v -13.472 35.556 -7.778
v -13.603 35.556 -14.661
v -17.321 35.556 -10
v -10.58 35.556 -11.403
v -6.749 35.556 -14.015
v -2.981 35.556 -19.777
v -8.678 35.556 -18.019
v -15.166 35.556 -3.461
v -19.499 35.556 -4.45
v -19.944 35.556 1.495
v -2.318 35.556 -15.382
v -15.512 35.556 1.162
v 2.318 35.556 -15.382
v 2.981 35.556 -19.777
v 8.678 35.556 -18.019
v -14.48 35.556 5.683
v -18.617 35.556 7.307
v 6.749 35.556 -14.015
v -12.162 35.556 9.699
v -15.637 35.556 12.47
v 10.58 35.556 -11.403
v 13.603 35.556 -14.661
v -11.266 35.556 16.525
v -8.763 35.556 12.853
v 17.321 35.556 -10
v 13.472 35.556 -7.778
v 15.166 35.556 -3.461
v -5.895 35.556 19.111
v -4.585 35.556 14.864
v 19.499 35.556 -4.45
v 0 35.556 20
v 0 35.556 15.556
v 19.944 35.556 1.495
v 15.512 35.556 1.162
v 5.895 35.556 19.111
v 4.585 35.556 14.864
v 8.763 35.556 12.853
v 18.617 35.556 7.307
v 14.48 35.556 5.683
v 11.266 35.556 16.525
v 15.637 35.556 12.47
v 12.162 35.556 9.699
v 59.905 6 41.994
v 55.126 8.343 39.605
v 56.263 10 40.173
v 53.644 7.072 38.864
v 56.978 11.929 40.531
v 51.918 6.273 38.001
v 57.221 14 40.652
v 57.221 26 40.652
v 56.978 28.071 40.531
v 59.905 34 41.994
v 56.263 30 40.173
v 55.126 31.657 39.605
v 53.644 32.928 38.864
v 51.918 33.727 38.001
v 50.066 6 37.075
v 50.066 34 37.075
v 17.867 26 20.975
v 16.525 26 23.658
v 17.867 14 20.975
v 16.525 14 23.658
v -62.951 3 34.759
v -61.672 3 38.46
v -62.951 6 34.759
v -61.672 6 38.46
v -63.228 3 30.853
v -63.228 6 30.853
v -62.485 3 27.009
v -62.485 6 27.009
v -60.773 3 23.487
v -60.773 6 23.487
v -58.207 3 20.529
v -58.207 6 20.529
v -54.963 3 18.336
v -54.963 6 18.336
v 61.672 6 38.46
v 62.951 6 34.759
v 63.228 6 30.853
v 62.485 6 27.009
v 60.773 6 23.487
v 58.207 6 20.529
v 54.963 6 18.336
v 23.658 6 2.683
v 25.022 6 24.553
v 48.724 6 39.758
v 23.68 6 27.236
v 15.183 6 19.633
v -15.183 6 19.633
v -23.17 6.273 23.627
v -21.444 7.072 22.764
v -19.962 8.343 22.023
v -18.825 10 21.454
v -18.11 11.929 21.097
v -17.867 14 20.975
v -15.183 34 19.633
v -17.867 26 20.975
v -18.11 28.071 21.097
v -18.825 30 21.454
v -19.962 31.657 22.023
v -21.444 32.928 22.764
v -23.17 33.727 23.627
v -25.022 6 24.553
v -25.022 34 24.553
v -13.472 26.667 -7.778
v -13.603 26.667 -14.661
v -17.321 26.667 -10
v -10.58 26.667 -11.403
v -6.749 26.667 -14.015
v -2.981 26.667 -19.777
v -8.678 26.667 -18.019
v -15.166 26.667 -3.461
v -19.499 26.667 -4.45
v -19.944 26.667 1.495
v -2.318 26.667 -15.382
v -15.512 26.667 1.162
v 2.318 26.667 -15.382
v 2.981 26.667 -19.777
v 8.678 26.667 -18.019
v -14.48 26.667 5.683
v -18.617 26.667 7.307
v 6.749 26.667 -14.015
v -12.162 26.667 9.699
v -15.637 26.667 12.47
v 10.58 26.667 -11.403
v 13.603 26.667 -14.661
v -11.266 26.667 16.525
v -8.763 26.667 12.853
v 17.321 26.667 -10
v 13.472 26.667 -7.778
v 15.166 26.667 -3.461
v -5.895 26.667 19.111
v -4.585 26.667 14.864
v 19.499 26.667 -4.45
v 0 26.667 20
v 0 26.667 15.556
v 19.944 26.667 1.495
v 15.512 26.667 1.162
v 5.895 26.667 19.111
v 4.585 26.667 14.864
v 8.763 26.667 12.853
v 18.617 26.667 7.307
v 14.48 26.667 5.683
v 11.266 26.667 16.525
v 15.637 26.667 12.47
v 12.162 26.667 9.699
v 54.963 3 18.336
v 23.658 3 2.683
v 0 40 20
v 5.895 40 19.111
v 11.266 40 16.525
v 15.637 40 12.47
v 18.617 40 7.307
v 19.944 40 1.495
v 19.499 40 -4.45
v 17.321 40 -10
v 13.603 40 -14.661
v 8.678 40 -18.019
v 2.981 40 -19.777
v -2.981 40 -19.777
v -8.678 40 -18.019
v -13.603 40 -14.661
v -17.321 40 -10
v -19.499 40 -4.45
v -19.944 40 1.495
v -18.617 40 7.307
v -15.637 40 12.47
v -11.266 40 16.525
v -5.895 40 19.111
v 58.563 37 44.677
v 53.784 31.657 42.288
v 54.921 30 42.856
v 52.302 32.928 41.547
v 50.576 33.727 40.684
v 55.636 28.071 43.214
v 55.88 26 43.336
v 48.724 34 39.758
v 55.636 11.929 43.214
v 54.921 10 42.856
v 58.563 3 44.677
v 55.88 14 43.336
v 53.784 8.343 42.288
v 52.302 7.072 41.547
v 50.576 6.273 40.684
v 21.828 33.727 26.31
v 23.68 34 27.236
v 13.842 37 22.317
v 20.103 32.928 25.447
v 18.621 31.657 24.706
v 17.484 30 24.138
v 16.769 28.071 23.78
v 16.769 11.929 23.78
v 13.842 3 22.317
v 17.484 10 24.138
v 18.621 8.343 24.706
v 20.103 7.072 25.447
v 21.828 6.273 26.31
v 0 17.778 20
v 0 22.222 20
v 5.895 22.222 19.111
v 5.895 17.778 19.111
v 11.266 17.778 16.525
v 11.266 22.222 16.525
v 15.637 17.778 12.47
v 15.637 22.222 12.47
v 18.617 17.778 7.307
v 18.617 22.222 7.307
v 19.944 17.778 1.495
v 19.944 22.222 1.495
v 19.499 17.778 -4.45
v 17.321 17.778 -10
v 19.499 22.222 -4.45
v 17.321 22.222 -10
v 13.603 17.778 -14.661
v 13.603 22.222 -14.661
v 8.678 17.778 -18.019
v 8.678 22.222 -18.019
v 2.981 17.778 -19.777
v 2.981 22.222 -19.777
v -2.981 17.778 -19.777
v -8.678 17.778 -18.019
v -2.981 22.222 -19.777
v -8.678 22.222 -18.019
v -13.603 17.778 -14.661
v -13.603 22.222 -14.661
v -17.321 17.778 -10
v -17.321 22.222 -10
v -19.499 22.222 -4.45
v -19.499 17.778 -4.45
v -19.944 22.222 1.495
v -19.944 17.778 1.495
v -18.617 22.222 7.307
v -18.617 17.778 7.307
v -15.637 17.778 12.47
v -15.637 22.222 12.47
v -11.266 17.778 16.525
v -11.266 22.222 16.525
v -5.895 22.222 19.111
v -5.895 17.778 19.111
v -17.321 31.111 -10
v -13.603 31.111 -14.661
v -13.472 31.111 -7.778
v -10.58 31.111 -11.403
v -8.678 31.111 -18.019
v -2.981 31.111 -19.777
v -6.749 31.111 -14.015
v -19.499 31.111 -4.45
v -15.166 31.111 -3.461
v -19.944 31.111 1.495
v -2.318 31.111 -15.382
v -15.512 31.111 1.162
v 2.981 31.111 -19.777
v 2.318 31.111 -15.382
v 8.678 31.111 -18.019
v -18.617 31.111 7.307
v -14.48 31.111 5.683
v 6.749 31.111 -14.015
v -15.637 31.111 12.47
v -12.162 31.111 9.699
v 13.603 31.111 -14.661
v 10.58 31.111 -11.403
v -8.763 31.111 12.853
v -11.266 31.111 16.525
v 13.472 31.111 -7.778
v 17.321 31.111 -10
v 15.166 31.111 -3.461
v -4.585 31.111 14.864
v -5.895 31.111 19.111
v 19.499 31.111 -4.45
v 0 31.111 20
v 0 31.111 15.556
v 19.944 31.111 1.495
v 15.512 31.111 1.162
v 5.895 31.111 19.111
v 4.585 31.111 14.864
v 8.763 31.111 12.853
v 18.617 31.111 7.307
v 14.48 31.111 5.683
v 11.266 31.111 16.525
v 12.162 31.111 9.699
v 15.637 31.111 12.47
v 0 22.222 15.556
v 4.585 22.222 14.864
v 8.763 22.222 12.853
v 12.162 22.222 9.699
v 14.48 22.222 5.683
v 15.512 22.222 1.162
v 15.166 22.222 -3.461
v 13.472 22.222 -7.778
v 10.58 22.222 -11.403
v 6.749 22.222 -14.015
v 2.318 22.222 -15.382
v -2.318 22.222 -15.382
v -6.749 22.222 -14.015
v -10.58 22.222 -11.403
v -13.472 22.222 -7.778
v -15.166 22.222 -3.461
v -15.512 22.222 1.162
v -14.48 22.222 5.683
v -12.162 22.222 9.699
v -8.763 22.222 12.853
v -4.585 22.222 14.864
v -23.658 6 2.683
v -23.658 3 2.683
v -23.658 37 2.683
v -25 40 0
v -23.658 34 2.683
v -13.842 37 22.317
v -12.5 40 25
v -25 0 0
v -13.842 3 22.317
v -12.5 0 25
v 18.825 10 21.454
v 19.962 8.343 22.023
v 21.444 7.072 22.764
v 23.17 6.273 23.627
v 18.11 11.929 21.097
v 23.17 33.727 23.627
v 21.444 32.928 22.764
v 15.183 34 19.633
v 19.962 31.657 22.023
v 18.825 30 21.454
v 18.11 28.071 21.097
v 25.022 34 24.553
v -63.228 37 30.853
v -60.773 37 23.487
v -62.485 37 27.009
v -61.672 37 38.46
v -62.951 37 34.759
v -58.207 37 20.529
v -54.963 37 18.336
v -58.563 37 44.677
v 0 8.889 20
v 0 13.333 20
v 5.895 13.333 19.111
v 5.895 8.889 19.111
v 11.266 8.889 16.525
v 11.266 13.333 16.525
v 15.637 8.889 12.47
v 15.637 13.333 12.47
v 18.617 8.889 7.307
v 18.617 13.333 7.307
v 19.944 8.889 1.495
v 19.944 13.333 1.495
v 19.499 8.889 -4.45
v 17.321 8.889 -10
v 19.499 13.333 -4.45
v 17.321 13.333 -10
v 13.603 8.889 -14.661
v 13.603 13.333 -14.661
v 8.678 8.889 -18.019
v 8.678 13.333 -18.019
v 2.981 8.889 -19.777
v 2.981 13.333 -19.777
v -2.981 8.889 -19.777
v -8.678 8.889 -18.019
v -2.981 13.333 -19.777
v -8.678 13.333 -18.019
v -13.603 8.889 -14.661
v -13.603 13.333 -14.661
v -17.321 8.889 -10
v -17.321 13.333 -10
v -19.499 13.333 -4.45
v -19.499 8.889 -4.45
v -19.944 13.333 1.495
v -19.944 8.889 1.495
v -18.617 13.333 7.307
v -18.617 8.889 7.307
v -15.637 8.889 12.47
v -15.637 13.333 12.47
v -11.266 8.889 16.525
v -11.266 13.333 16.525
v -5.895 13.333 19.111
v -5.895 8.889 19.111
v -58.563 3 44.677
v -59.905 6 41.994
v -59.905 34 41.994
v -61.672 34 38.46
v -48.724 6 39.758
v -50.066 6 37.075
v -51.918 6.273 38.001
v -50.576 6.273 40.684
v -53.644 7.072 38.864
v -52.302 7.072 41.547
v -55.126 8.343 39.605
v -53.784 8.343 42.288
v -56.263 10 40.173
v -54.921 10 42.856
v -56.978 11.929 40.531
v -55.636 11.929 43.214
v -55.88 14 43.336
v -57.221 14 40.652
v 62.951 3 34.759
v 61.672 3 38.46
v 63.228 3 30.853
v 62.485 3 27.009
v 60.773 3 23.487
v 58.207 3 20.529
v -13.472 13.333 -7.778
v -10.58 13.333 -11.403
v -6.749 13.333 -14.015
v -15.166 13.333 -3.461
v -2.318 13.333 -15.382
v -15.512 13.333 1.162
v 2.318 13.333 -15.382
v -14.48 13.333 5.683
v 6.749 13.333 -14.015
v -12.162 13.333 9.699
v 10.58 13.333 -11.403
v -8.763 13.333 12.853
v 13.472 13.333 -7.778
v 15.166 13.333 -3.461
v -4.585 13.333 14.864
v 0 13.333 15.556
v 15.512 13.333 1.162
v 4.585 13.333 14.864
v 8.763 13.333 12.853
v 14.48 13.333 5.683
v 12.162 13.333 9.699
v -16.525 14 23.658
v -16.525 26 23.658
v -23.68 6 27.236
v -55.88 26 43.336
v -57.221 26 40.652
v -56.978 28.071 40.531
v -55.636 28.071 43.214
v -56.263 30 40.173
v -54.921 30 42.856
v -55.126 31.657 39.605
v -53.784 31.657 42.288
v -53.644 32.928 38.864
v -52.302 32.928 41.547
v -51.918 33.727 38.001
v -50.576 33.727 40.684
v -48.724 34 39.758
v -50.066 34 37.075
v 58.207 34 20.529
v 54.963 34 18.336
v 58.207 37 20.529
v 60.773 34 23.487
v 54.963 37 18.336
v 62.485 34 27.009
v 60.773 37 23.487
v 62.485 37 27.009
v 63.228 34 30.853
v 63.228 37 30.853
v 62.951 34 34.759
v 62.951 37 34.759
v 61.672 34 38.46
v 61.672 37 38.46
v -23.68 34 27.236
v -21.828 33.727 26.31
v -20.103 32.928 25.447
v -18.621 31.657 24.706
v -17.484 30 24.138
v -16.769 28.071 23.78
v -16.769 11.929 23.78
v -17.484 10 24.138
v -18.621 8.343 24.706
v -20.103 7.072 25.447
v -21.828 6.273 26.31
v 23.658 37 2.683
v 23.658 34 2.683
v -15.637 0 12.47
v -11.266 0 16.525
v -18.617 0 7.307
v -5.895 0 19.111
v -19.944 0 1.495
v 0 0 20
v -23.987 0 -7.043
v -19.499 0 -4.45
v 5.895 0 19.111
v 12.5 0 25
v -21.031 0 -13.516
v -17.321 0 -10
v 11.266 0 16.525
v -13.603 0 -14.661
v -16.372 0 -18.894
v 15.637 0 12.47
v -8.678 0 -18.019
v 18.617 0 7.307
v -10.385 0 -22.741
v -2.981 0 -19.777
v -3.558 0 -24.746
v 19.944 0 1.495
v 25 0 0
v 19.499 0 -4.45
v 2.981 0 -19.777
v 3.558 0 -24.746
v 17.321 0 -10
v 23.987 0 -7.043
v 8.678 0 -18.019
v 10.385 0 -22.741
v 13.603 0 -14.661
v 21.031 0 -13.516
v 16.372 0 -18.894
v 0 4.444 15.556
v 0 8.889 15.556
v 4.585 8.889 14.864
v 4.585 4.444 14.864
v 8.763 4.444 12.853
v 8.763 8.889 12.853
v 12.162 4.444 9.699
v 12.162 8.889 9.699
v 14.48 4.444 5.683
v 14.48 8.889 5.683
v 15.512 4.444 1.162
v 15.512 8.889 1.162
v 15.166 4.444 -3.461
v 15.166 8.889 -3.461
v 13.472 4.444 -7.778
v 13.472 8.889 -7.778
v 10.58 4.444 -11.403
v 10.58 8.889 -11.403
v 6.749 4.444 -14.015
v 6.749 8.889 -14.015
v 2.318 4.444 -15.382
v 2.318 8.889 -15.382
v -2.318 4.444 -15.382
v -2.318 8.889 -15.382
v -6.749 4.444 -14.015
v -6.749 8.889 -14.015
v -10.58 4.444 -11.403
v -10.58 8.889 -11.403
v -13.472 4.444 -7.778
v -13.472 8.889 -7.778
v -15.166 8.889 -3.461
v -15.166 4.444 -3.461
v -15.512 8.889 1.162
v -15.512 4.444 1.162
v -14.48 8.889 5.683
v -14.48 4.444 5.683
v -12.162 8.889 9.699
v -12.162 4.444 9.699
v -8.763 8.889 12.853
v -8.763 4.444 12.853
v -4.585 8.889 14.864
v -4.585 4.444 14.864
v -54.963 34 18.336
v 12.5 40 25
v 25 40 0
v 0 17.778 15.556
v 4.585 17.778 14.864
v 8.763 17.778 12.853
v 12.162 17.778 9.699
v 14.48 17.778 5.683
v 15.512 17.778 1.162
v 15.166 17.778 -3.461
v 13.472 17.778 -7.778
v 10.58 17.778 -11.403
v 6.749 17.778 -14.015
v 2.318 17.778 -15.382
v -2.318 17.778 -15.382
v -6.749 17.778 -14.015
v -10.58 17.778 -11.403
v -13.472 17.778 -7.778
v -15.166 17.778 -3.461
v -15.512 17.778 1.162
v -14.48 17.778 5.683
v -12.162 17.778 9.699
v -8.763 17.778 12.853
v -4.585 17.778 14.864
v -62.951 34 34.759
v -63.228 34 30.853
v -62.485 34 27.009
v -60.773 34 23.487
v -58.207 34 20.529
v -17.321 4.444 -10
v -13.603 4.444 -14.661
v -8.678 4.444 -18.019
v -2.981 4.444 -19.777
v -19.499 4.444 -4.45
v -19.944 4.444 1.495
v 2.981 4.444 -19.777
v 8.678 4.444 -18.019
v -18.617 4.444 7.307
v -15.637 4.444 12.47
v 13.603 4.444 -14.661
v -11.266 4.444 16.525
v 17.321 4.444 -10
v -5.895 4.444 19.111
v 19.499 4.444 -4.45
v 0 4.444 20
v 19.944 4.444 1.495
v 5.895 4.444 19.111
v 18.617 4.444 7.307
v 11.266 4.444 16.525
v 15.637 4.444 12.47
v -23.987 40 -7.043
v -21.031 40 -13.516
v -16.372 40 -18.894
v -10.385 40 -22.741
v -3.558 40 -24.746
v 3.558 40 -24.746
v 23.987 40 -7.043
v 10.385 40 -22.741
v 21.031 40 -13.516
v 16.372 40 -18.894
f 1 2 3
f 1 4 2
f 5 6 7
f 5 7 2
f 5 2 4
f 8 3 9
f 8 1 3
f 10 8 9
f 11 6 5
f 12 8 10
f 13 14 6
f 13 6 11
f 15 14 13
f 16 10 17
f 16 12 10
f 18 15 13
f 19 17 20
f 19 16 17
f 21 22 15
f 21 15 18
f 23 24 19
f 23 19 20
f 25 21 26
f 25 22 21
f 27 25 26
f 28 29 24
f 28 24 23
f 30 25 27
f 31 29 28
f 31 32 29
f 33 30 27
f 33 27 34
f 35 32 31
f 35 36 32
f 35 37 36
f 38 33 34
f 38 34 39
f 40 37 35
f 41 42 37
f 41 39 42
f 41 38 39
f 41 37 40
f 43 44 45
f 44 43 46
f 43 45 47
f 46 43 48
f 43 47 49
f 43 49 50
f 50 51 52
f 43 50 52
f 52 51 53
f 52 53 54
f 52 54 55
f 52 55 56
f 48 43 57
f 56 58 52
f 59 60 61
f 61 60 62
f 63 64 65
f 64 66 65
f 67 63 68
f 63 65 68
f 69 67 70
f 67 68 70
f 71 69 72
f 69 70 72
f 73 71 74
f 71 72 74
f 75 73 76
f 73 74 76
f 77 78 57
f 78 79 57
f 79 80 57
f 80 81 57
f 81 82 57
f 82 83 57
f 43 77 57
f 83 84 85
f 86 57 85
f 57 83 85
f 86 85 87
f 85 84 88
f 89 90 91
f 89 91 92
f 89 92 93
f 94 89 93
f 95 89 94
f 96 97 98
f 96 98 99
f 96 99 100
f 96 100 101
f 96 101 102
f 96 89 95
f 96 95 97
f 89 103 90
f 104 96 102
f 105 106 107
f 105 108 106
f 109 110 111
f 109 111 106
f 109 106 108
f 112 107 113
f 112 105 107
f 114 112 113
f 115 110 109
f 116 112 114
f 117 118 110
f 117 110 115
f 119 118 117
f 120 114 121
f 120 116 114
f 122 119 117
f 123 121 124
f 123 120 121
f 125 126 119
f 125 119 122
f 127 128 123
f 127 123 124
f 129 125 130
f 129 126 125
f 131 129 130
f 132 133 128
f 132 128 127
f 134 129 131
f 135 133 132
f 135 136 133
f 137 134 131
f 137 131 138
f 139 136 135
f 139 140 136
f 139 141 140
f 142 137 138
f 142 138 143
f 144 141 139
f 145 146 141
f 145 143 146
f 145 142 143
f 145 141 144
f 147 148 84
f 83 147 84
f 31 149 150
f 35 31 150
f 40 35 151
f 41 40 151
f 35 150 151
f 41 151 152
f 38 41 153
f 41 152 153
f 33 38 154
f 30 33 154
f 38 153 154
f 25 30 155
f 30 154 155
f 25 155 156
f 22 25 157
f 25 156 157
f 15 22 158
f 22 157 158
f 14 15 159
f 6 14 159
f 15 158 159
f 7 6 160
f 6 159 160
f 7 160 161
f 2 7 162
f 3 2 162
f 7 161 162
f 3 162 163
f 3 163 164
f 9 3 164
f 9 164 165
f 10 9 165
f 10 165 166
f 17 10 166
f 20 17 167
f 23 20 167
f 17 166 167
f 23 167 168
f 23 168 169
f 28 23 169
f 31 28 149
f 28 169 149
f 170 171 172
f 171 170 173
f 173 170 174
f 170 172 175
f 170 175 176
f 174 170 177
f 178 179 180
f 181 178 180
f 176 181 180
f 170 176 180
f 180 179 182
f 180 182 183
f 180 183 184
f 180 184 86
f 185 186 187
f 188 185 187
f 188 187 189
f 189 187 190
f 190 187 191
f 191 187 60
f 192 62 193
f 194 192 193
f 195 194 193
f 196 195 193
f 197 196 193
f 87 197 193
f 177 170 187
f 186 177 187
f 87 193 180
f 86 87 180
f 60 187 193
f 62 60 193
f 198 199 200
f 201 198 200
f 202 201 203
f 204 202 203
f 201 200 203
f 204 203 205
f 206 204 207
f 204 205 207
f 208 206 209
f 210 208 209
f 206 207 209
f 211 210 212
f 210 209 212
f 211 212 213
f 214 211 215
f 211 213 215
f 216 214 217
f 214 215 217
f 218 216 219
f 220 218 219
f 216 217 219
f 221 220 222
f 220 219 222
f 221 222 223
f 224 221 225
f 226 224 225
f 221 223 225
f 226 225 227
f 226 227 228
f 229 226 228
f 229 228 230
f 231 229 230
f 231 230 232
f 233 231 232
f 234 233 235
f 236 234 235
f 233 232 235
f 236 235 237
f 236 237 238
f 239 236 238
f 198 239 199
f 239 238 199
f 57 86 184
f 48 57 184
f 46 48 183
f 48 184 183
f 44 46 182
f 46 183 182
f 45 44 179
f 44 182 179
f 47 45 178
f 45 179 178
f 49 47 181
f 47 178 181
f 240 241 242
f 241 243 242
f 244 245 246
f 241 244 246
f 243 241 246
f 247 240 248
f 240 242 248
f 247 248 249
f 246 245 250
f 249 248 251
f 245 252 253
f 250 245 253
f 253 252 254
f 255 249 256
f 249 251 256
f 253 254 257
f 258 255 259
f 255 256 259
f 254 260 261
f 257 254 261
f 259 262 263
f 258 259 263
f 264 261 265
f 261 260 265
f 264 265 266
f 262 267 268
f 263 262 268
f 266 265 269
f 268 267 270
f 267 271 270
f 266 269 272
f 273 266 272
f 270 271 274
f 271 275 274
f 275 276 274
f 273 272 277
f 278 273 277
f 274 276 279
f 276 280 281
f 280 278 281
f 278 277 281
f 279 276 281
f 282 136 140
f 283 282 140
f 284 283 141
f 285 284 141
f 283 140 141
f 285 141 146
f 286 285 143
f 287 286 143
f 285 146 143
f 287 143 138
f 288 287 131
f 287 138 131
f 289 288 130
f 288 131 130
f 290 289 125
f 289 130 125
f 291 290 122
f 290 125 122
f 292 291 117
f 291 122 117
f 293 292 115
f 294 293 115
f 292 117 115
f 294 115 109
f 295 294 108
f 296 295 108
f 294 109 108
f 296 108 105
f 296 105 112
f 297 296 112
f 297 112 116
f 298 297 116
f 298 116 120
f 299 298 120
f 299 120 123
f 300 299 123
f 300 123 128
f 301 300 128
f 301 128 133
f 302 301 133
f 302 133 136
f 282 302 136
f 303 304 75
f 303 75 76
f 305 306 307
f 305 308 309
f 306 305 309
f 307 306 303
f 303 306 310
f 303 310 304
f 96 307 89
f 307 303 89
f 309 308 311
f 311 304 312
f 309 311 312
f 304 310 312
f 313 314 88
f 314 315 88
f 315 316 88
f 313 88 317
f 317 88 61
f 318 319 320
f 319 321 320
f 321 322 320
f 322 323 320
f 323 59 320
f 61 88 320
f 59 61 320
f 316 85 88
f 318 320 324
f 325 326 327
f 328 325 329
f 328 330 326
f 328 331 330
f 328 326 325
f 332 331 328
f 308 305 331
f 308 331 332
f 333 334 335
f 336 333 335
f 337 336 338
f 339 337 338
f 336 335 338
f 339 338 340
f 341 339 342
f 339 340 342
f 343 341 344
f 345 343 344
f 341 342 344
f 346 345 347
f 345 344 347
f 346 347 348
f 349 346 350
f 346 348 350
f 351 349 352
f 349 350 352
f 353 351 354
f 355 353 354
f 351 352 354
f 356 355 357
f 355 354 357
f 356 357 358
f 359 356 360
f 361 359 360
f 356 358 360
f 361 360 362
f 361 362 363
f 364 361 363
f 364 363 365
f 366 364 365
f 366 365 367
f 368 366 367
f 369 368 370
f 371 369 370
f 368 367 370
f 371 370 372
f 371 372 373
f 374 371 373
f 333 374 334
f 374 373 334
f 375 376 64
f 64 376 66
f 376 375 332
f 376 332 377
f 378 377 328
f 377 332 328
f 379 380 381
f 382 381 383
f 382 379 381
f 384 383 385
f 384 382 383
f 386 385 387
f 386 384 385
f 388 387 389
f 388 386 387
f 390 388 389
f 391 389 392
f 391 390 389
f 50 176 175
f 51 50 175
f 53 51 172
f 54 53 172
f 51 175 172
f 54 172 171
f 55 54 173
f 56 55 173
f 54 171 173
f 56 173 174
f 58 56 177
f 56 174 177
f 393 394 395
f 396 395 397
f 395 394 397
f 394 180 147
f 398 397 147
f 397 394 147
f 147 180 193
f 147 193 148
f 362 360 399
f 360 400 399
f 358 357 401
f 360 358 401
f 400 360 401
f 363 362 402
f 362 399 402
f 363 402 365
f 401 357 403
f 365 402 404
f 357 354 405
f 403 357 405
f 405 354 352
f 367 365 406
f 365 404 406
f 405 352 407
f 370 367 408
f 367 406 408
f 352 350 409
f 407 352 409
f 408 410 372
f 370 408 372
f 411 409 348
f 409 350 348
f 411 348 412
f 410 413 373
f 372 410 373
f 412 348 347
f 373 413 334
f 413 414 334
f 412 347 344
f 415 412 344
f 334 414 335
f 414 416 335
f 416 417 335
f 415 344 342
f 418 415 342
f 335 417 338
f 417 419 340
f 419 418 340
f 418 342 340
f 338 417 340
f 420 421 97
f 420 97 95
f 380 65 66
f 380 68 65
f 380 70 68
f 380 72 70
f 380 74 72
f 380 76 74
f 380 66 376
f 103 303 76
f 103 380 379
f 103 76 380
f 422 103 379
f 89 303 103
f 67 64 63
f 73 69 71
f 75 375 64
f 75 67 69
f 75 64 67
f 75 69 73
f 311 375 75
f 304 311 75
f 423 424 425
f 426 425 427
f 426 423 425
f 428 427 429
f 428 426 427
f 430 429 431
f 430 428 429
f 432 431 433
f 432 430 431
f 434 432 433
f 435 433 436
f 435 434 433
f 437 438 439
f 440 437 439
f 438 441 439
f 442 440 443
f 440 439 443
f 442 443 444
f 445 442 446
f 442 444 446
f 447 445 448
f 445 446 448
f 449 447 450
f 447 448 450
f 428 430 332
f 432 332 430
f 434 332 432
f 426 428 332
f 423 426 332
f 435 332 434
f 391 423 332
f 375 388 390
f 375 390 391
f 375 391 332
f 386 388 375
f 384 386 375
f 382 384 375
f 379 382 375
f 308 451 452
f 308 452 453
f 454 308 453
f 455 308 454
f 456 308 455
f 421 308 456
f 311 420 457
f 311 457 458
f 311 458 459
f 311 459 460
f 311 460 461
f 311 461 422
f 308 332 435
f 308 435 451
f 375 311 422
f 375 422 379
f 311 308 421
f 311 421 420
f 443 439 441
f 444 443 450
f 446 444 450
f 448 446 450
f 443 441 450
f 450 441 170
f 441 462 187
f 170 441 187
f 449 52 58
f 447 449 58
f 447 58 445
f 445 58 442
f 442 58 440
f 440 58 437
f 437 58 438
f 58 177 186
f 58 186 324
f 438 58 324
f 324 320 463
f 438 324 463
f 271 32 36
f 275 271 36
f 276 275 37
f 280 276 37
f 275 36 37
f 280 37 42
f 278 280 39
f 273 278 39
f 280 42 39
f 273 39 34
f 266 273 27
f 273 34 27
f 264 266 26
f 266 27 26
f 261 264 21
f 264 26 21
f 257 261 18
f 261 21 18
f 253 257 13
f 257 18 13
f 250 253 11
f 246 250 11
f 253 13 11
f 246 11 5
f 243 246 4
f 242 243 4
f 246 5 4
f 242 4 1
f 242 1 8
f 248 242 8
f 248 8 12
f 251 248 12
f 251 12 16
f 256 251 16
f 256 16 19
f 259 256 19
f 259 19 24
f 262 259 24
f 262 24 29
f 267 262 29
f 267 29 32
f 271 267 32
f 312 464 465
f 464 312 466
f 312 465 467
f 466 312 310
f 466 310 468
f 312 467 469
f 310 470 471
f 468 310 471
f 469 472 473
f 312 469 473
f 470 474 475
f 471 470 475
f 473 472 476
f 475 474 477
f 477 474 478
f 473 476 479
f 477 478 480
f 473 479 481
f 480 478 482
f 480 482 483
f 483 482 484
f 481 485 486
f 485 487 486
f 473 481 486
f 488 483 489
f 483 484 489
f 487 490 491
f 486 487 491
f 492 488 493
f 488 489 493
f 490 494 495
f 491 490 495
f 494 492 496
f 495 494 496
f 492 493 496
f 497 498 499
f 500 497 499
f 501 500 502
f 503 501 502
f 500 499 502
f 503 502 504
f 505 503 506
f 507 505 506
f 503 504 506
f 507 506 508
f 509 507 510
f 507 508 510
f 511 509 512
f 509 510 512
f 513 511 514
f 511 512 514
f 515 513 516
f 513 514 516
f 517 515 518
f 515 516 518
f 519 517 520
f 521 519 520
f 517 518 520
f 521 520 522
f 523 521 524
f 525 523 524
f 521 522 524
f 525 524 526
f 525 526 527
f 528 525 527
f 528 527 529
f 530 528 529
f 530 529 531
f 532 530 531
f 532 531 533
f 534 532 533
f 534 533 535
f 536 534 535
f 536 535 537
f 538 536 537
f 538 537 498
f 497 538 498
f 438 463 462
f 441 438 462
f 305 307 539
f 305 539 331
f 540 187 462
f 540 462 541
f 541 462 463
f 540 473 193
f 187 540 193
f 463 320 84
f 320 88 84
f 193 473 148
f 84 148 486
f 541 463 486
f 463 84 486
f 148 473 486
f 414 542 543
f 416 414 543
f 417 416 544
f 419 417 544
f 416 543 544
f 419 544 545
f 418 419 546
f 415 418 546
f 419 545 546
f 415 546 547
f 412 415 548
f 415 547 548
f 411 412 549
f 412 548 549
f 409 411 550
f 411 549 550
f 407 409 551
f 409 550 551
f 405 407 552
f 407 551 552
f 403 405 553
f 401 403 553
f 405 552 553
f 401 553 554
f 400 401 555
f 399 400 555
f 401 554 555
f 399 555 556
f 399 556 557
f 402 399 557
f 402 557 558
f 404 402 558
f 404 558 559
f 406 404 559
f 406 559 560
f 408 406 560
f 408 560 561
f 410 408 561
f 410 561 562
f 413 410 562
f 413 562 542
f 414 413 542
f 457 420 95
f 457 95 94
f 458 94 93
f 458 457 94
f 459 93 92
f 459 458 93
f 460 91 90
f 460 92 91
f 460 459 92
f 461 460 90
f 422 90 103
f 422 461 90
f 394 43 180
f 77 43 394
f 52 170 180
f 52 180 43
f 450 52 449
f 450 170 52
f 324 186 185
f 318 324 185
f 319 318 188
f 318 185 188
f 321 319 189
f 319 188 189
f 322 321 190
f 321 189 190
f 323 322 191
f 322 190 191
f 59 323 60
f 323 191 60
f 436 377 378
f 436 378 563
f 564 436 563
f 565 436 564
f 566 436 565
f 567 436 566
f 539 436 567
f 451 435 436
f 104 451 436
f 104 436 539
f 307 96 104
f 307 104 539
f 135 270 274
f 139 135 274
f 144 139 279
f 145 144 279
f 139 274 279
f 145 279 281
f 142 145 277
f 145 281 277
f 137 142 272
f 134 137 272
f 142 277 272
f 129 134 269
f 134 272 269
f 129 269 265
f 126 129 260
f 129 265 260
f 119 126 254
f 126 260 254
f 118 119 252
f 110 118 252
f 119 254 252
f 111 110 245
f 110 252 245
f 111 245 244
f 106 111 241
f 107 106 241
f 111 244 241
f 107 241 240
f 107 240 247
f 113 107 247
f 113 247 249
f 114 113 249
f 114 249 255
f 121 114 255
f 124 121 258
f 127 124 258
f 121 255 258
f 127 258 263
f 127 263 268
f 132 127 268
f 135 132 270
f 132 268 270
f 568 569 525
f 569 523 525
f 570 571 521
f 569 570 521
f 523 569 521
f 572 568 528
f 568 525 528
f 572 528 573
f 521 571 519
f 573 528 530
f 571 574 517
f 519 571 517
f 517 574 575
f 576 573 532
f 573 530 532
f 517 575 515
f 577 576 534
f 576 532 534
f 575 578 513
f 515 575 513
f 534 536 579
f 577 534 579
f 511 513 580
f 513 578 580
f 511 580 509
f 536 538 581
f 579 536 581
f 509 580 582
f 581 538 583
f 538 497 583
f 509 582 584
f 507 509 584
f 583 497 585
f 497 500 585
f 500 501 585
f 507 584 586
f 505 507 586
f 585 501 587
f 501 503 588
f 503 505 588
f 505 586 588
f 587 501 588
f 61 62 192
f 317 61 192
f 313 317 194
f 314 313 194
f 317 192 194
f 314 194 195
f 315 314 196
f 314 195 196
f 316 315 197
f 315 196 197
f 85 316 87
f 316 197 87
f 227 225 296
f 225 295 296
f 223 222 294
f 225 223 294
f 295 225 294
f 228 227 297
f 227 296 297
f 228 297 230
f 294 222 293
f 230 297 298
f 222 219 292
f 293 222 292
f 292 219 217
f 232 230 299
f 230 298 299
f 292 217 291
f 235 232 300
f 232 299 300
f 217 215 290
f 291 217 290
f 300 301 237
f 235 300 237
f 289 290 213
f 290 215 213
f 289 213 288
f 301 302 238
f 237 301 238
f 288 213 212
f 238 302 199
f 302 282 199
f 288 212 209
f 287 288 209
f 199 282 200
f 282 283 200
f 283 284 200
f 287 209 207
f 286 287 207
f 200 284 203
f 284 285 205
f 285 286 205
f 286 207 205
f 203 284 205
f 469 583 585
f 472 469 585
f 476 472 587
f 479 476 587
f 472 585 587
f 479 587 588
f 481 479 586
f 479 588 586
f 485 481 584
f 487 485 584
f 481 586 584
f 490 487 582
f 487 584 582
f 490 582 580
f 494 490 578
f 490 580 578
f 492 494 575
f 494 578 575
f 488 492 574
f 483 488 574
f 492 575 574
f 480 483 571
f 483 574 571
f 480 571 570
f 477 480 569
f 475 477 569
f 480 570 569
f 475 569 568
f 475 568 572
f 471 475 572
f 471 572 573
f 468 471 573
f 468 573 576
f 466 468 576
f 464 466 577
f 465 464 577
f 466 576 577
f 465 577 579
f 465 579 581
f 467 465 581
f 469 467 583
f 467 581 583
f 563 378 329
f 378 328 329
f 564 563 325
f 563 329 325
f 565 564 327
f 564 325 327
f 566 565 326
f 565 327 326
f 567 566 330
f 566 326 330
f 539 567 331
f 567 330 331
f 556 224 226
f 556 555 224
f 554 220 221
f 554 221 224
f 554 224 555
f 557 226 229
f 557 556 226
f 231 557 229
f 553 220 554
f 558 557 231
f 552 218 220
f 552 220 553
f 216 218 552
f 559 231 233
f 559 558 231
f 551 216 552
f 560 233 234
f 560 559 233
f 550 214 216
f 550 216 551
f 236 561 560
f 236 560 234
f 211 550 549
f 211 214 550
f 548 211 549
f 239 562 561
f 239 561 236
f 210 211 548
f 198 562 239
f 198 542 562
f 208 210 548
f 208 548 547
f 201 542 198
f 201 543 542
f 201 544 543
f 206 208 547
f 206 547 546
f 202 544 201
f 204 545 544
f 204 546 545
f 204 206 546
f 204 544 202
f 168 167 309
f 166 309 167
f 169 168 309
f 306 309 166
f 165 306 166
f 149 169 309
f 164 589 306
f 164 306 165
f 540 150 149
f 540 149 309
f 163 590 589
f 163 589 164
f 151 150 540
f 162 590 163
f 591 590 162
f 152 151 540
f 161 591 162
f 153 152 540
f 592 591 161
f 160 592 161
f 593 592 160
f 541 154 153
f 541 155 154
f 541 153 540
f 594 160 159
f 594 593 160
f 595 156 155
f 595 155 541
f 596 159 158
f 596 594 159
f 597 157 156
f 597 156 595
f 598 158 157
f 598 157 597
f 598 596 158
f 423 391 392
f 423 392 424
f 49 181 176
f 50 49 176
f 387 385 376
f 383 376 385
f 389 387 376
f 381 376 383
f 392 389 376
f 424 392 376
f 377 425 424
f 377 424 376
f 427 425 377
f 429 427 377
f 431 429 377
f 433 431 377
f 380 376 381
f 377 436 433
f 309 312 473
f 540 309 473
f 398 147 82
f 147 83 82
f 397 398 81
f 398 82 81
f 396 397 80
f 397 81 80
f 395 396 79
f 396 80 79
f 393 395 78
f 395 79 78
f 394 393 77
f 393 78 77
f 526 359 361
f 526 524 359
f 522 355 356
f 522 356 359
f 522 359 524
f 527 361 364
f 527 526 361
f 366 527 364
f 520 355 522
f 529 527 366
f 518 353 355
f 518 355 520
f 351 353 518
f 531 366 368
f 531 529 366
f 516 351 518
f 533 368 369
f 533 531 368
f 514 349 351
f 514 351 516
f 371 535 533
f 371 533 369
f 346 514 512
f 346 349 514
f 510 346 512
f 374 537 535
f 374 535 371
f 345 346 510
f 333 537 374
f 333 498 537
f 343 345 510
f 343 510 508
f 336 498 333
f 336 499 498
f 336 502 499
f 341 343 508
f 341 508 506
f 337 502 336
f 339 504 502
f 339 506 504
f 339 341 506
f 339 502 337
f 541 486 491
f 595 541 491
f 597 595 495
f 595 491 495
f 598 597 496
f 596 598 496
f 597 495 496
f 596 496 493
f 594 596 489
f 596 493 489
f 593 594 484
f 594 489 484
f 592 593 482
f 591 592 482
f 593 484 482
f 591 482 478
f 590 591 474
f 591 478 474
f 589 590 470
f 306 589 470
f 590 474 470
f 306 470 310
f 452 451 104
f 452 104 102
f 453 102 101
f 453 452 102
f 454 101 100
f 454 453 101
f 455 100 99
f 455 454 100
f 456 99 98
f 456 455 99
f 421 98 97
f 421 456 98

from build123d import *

# Parameters (mm, degrees)
EXTRUDE_1_DEPTH        = 40
EXTRUDE_2_DEPTH        = 50
FILLET_1_R             = 15
CUT_EXTRUDE_1_DEPTH    = 50
FILLET_1_OF_MIRROR_2_R = 15
SKETCH_4_R             = 20
CUT_EXTRUDE_2_DEPTH    = 4.444444444
SKETCH_5_R             = 15.555555556
CUT_EXTRUDE_3_DEPTH    = 86.214294565
PATTERN_LINEAR_1_COUNT = 5
PATTERN_LINEAR_1_PITCH = 8.888888889


with BuildPart() as part:
    # 草图1 → 凸台-拉伸1 (new body)
    with BuildSketch(Plane(origin=(0, 0, 0), x_dir=(1, 0, 0), z_dir=(0, 1, 0))):
        with BuildLine():
            Line((-25, 0), (-12.5, -25))
            Line((-12.5, -25), (12.5, -25))
            Line((12.5, -25), (25, 0))
            ThreePointArc((25, 0), (0, 25), (-25, 0))
        make_face()
    extrude(amount=EXTRUDE_1_DEPTH)

    # 草图2 → 凸台-拉伸2 (add)
    with BuildSketch(Plane(origin=(20, 0, 10), x_dir=(0.447213595499958, 0, -0.894427190999916), z_dir=(0.894427190999916, 0, 0.447213595499958))):
        Polygon((8.180339887, 34), (8.180339887, 37), (-13.770509831, 37), (-13.770509831, 3), (8.180339887, 3), (8.180339887, 6), (-10.770509831, 6), (-10.770509831, 34), align=None)
    extrude_2 = extrude(amount=EXTRUDE_2_DEPTH)

    # 圆角1
    fillet_1_edges = [part.edges().sort_by_distance(p)[0] for p in [
        (68.379718763, 35.5, 25.043961348),
        (68.379718763, 4.5, 25.043961348),
    ]]
    fillet(fillet_1_edges, radius=FILLET_1_R)

    # 草图3 → 切除-拉伸1 (cut)
    with BuildSketch(Plane(origin=(-6.158359214, 0, 12.316718427), x_dir=(0.8944271909999159, 0, 0.44721359549995804), z_dir=(-0.44721359549995804, 0, 0.8944271909999159))):
        with BuildLine():
            Line((25.360679775, 26), (25.360679775, 14))
            ThreePointArc((25.360679775, 14), (27.703825526, 8.343145751), (33.360679775, 6))
            Line((33.360679775, 6), (61.360679775, 6))
            ThreePointArc((61.360679775, 6), (67.017534024, 8.343145751), (69.360679775, 14))
            Line((69.360679775, 14), (69.360679775, 26))
            ThreePointArc((69.360679775, 26), (67.017534024, 31.656854249), (61.360679775, 34))
            Line((61.360679775, 34), (33.360679775, 34))
            ThreePointArc((33.360679775, 34), (27.703825526, 31.656854249), (25.360679775, 26))
        make_face()
    cut_extrude_1 = extrude(amount=-CUT_EXTRUDE_1_DEPTH, mode=Mode.SUBTRACT)

    # 镜向2: 凸台-拉伸2, 切除-拉伸1 across plane
    add(extrude_2.mirror(Plane(origin=(0, 0, 0), x_dir=(0, 0, 1), z_dir=(1, 0, 0))))
    add(cut_extrude_1.mirror(Plane(origin=(0, 0, 0), x_dir=(0, 0, 1), z_dir=(1, 0, 0))), mode=Mode.SUBTRACT)

    # 圆角1 of 镜向2
    fillet_1_of_mirror_2_edges = [part.edges().sort_by_distance(p)[0] for p in [
        (-68.379718763, 35.5, 25.043961348),
        (-68.379718763, 4.5, 25.043961348),
    ]]
    fillet(fillet_1_of_mirror_2_edges, radius=FILLET_1_OF_MIRROR_2_R)

    # 草图4 → 切除-拉伸2 (cut)
    with BuildSketch(Plane(origin=(0, 40, 0), x_dir=(1, 0, 0), z_dir=(0, 1, 0))):
        with Locations(Location((0, 0, 0), (0, 0, 270))):
            Circle(SKETCH_4_R)
    cut_extrude_2 = extrude(amount=-CUT_EXTRUDE_2_DEPTH, mode=Mode.SUBTRACT)

    # 草图5 → 切除-拉伸3 (cut, through all)
    with BuildSketch(Plane(origin=(0, 35.555555556, 0), x_dir=(1, 0, 0), z_dir=(0, 1, 0))):
        with Locations(Location((0, 0, 0), (0, 0, 270))):
            Circle(SKETCH_5_R)
    extrude(amount=-CUT_EXTRUDE_3_DEPTH, mode=Mode.SUBTRACT)

    # 阵列(线性)1: 切除-拉伸2 ×5
    with Locations(*[(0, -i * PATTERN_LINEAR_1_PITCH, 0) for i in range(1, PATTERN_LINEAR_1_COUNT)]):
        add(cut_extrude_2, mode=Mode.SUBTRACT)


solid = part.part
